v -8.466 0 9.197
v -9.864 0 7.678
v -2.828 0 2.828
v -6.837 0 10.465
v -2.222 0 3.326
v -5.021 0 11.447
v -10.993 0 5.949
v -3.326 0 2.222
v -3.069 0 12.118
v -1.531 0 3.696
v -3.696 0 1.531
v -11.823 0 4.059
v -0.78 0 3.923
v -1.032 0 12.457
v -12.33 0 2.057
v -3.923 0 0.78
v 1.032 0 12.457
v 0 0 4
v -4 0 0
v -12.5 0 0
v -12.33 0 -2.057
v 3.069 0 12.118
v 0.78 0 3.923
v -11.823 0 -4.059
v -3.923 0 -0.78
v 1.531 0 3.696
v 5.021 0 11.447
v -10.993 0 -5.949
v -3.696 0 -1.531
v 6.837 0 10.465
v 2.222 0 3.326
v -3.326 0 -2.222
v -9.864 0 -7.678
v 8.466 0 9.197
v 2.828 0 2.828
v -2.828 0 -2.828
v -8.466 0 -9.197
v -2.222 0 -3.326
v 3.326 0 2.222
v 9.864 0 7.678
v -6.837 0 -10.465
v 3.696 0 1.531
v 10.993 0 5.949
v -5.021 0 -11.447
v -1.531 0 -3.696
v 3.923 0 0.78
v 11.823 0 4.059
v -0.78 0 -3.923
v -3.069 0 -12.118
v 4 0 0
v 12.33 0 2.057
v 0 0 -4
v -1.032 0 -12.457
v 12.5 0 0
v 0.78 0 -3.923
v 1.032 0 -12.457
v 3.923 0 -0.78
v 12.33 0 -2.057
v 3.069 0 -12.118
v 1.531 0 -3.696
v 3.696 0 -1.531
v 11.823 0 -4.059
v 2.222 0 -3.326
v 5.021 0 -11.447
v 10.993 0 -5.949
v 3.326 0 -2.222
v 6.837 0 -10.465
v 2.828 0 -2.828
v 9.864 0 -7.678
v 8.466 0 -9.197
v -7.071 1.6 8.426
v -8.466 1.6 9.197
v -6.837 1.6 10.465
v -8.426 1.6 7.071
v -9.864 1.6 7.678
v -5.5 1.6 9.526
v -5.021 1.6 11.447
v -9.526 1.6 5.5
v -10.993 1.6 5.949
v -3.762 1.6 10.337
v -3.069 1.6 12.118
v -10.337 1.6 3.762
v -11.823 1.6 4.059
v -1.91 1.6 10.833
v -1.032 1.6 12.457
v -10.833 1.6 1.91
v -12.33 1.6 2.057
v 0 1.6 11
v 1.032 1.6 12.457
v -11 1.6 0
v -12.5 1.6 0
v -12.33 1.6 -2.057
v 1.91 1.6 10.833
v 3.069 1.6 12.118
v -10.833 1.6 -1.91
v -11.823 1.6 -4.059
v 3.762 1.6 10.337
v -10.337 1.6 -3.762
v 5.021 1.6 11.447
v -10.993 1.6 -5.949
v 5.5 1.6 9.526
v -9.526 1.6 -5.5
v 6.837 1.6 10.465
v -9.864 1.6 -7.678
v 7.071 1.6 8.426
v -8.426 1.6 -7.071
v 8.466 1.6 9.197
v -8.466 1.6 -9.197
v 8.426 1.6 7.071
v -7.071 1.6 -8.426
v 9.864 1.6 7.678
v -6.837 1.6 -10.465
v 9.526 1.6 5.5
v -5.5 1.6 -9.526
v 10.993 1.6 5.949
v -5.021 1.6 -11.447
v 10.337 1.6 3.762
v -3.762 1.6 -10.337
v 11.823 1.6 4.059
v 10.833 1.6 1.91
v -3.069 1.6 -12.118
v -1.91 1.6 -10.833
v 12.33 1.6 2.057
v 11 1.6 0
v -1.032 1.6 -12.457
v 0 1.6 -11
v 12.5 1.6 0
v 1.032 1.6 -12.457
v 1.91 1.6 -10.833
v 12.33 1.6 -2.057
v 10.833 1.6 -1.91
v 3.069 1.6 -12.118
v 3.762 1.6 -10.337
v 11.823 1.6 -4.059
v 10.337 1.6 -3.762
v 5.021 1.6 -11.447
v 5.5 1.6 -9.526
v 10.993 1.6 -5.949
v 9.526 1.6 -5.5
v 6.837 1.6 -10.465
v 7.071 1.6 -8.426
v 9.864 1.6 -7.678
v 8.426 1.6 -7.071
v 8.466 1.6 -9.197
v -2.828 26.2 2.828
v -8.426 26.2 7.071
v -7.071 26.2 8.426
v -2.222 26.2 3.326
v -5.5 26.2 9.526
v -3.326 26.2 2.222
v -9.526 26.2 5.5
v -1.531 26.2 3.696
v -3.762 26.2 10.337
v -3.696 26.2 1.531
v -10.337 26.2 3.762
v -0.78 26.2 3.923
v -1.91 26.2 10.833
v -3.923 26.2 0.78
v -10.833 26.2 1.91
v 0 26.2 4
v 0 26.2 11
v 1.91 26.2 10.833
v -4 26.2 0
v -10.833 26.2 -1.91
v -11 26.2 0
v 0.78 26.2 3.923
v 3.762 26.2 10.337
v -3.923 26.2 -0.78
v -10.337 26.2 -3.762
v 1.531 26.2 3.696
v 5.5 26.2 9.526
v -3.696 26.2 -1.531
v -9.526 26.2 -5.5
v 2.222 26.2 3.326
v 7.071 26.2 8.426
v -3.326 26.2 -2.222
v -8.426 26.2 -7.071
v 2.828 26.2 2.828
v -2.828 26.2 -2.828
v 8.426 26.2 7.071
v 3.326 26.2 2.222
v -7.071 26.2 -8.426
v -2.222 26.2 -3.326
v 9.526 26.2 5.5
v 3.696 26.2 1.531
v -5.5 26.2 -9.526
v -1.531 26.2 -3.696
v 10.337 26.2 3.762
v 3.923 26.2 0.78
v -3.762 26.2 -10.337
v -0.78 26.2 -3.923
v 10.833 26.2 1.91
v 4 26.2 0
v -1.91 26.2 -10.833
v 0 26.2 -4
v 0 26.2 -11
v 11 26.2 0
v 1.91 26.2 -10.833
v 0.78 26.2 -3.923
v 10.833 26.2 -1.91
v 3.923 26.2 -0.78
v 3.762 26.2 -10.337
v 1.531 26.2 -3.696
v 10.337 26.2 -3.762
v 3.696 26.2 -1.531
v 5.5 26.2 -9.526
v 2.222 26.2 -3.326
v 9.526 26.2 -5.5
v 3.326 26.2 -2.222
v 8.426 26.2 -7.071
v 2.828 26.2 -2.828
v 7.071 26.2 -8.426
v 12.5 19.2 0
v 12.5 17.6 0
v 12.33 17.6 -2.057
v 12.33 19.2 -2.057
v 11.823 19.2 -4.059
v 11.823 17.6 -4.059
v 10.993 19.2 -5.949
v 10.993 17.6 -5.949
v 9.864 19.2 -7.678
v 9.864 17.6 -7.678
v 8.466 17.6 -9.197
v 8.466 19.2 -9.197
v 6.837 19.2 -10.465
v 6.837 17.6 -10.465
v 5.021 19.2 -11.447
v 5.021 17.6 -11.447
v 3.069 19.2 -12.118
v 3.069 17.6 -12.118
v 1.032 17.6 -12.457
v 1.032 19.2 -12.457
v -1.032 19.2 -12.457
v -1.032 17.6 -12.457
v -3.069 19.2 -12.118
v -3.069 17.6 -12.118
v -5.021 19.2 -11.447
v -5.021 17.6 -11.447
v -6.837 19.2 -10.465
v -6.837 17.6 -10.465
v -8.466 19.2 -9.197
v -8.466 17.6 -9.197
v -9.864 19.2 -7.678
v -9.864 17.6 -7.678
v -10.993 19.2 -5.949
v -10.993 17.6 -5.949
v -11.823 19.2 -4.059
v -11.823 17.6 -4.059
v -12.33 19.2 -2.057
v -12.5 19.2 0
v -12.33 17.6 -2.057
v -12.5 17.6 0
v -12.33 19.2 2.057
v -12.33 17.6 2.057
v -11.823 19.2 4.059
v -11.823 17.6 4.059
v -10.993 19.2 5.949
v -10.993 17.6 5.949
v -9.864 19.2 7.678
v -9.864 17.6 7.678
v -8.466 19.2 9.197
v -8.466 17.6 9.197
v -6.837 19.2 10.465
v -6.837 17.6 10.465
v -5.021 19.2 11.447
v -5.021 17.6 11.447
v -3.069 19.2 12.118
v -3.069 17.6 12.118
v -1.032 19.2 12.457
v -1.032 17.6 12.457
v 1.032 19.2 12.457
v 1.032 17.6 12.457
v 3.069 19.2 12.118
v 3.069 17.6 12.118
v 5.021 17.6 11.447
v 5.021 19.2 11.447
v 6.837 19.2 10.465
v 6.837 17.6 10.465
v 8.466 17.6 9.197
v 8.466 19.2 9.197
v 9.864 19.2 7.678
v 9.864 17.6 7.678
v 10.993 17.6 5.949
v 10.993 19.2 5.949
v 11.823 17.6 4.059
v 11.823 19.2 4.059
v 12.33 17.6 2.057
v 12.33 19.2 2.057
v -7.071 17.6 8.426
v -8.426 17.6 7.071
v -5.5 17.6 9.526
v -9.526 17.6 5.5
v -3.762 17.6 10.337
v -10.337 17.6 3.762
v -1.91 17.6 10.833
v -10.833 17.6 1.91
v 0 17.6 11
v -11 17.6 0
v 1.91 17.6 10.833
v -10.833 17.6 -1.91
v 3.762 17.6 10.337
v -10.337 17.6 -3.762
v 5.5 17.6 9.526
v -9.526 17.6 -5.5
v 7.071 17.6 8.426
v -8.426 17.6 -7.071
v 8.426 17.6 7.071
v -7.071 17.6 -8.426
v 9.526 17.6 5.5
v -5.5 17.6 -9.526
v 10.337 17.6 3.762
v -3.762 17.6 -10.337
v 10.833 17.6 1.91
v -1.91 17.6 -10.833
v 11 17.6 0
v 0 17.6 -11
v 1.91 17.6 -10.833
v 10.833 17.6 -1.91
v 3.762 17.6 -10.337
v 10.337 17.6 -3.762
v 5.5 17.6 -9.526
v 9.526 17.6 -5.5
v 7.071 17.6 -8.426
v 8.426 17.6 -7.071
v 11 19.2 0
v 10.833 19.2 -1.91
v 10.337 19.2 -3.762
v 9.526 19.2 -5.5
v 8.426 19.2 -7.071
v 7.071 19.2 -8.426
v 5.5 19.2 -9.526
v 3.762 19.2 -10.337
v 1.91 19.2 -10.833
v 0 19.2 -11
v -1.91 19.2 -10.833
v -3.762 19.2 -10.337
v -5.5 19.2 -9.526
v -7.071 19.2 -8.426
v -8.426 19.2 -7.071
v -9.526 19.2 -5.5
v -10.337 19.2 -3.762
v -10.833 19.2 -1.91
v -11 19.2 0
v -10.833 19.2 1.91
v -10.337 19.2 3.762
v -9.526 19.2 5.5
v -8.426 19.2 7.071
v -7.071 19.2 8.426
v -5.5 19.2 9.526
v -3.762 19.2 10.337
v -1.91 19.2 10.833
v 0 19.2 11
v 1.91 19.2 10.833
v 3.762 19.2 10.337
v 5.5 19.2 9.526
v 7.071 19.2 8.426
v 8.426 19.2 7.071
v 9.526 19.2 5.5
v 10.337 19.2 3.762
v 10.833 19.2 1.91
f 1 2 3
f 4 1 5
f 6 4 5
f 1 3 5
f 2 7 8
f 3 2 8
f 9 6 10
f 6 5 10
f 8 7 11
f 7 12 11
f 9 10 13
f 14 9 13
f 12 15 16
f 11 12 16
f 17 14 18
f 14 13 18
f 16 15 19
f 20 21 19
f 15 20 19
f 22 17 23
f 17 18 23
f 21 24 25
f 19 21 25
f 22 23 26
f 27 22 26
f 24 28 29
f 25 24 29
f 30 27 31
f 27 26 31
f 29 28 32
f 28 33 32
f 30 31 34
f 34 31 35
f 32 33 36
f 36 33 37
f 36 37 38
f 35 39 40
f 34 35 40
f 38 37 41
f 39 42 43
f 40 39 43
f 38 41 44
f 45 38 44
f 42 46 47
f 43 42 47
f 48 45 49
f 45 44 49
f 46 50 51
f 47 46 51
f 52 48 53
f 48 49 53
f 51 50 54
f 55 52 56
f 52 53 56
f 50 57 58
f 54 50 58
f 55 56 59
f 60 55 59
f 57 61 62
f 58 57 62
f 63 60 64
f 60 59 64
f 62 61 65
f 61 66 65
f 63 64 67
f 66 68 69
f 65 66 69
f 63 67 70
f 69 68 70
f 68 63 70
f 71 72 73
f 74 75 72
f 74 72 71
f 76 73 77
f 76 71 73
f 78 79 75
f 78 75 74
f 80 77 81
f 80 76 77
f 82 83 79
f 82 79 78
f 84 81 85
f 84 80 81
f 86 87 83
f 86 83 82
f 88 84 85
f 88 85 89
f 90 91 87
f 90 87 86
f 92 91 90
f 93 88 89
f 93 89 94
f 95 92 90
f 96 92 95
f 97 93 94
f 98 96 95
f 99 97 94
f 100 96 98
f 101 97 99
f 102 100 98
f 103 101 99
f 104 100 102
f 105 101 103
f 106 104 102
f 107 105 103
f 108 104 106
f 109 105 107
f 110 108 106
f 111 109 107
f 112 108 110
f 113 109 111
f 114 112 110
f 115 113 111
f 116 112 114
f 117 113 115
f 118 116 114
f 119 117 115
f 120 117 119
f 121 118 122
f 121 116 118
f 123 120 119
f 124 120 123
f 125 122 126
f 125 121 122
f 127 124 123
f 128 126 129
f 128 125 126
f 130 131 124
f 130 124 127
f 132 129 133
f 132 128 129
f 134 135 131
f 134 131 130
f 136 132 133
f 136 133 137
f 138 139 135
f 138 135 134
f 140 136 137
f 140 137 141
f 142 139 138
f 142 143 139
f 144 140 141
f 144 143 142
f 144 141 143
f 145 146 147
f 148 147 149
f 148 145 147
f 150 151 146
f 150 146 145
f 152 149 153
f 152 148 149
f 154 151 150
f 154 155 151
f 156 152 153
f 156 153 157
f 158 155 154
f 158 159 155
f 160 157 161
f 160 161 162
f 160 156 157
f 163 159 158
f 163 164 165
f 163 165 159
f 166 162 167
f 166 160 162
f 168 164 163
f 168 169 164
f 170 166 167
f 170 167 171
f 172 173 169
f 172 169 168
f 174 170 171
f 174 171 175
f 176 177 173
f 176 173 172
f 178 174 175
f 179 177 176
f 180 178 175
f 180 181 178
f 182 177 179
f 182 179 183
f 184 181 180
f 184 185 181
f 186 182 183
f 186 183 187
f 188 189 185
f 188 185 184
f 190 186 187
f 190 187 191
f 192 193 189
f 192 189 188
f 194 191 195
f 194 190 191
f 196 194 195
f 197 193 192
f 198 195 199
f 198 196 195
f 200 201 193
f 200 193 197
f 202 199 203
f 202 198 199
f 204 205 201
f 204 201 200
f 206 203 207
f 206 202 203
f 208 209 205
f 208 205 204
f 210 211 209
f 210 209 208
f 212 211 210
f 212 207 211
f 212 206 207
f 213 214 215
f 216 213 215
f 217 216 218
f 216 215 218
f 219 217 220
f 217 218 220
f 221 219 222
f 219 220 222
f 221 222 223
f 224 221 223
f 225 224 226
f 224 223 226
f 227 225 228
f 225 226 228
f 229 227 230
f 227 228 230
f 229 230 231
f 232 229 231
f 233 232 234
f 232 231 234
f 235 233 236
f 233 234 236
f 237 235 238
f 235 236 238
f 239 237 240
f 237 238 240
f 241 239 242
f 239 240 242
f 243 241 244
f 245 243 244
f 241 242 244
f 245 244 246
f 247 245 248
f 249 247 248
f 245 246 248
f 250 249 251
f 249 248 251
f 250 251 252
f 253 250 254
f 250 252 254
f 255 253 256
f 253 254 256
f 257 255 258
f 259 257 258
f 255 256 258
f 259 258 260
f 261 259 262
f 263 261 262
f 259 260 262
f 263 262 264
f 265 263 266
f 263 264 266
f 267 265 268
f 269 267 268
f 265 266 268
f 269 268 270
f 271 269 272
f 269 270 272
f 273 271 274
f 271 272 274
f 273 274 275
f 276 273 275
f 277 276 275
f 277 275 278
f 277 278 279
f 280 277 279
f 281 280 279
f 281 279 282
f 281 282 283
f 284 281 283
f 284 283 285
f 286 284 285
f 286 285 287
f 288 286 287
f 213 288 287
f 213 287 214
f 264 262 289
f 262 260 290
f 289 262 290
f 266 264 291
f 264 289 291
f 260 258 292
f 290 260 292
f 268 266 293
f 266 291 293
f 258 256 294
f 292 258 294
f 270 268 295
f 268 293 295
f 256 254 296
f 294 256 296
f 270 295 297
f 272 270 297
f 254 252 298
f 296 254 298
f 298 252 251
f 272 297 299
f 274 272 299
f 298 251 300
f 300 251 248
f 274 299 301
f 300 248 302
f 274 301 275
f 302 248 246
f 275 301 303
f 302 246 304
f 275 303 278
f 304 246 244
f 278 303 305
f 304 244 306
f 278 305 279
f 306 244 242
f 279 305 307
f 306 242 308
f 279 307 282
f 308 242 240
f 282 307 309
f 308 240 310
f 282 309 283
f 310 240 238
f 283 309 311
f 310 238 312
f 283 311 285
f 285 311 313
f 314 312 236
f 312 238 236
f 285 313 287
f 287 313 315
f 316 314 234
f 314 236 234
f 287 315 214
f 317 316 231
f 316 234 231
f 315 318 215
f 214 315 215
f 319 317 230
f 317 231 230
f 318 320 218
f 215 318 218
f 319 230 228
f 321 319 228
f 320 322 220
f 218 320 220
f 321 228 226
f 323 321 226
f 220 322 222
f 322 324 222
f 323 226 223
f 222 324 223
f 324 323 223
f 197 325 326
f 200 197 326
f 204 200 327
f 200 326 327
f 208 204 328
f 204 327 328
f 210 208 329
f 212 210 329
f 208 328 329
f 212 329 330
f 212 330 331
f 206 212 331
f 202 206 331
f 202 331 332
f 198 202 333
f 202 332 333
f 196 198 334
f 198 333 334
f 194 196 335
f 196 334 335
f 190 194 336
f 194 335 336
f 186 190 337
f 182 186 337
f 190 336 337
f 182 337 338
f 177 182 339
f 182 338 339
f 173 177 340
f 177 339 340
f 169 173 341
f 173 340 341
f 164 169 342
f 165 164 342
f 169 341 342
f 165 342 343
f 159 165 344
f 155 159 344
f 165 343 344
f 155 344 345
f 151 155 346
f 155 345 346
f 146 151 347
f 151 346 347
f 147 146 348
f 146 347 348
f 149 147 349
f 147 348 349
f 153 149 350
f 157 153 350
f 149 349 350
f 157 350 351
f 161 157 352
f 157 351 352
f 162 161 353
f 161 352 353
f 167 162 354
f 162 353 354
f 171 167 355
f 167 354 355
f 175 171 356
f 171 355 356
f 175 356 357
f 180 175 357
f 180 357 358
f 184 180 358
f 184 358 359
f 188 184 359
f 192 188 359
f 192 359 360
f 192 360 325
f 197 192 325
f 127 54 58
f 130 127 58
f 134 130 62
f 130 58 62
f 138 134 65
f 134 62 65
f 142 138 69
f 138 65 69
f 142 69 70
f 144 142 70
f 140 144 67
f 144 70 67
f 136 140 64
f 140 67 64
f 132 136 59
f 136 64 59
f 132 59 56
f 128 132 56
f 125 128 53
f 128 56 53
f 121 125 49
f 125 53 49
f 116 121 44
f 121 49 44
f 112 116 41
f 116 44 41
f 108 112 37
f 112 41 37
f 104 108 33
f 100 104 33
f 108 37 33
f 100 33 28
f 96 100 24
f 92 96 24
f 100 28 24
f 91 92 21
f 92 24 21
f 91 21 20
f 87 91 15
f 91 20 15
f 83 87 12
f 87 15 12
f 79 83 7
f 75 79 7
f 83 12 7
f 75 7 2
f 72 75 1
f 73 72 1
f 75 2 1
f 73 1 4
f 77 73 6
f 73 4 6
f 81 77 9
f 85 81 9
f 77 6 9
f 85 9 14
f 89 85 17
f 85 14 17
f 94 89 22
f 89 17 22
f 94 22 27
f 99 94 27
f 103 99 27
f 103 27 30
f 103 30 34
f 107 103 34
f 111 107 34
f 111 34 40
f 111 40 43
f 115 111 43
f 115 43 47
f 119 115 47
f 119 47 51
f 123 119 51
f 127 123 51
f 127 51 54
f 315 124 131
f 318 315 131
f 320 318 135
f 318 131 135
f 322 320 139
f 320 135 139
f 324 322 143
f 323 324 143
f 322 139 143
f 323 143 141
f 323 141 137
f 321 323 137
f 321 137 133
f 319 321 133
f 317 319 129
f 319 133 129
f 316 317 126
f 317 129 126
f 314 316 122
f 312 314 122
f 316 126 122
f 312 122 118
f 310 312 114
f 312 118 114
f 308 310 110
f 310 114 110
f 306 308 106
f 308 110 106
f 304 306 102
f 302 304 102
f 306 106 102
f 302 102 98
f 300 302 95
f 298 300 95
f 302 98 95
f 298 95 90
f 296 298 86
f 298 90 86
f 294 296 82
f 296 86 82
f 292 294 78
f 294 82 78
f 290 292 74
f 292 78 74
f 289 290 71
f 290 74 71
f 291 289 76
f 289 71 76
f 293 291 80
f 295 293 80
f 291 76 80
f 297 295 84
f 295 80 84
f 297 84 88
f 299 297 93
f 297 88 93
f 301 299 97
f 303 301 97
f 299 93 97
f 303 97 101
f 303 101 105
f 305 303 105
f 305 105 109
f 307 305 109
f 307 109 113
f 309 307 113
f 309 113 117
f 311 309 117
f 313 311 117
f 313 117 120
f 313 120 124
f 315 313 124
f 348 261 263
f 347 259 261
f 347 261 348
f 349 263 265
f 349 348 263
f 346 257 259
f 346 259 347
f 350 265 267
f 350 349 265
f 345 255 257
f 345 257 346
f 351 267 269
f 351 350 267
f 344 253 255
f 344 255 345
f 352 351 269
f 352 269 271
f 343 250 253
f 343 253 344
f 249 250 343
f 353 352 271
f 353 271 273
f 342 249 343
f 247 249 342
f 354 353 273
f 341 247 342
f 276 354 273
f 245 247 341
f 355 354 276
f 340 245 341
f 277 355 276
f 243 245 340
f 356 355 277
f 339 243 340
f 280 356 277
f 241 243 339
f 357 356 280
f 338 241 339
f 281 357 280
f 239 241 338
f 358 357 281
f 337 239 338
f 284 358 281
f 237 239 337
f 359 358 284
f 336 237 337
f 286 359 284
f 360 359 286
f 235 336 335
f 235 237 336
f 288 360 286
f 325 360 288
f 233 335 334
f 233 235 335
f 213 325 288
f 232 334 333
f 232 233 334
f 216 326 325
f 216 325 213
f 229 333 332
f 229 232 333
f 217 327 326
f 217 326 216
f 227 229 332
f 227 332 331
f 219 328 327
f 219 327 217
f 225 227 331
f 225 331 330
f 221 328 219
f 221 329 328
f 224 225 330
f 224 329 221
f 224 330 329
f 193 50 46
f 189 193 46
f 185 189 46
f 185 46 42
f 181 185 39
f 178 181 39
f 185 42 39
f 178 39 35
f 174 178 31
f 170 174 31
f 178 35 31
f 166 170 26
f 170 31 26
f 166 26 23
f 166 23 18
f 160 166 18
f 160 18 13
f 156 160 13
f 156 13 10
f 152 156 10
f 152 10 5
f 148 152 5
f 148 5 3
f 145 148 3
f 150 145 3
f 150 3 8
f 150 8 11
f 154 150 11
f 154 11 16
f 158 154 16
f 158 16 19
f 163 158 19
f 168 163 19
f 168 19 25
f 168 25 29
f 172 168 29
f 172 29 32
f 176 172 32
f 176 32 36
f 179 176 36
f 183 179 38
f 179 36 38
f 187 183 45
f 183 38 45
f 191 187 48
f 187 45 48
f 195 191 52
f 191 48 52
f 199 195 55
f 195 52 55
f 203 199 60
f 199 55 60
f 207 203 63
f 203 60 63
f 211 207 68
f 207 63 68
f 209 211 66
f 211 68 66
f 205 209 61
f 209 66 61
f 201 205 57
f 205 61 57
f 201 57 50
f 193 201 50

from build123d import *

# Parameters (mm, degrees)
SKETCH1_R           = 12.5
BOSS_EXTRUDE1_DEPTH = 1.6
SKETCH2_R           = 11
BOSS_EXTRUDE2_DEPTH = 16
SKETCH3_R           = 12.5
BOSS_EXTRUDE3_DEPTH = 1.6
SKETCH4_R           = 11
BOSS_EXTRUDE4_DEPTH = 7
SKETCH5_R           = 4
CUT_EXTRUDE1_DEPTH  = 27.2


with BuildPart() as part:
    # Sketch1 → Boss-Extrude1 (new body)
    with BuildSketch(Plane(origin=(0, 0, 0), x_dir=(1, 0, 0), z_dir=(0, 1, 0))):
        Circle(SKETCH1_R)
    extrude(amount=BOSS_EXTRUDE1_DEPTH)

    # Sketch2 → Boss-Extrude2 (add)
    with BuildSketch(Plane(origin=(0, 1.6, 0), x_dir=(1, 0, 0), z_dir=(0, 1, 0))):
        Circle(SKETCH2_R)
    extrude(amount=BOSS_EXTRUDE2_DEPTH)

    # Sketch3 → Boss-Extrude3 (add)
    with BuildSketch(Plane(origin=(0, 17.6, 0), x_dir=(1, 0, 0), z_dir=(0, 1, 0))):
        Circle(SKETCH3_R)
    extrude(amount=BOSS_EXTRUDE3_DEPTH)

    # Sketch4 → Boss-Extrude4 (add)
    with BuildSketch(Plane(origin=(0, 19.2, 0), x_dir=(1, 0, 0), z_dir=(0, 1, 0))):
        Circle(SKETCH4_R)
    extrude(amount=BOSS_EXTRUDE4_DEPTH)

    # Sketch5 → Cut-Extrude1 (cut, through all)
    with BuildSketch(Plane.XZ):
        Circle(SKETCH5_R)
    extrude(amount=-CUT_EXTRUDE1_DEPTH, mode=Mode.SUBTRACT)


solid = part.part
